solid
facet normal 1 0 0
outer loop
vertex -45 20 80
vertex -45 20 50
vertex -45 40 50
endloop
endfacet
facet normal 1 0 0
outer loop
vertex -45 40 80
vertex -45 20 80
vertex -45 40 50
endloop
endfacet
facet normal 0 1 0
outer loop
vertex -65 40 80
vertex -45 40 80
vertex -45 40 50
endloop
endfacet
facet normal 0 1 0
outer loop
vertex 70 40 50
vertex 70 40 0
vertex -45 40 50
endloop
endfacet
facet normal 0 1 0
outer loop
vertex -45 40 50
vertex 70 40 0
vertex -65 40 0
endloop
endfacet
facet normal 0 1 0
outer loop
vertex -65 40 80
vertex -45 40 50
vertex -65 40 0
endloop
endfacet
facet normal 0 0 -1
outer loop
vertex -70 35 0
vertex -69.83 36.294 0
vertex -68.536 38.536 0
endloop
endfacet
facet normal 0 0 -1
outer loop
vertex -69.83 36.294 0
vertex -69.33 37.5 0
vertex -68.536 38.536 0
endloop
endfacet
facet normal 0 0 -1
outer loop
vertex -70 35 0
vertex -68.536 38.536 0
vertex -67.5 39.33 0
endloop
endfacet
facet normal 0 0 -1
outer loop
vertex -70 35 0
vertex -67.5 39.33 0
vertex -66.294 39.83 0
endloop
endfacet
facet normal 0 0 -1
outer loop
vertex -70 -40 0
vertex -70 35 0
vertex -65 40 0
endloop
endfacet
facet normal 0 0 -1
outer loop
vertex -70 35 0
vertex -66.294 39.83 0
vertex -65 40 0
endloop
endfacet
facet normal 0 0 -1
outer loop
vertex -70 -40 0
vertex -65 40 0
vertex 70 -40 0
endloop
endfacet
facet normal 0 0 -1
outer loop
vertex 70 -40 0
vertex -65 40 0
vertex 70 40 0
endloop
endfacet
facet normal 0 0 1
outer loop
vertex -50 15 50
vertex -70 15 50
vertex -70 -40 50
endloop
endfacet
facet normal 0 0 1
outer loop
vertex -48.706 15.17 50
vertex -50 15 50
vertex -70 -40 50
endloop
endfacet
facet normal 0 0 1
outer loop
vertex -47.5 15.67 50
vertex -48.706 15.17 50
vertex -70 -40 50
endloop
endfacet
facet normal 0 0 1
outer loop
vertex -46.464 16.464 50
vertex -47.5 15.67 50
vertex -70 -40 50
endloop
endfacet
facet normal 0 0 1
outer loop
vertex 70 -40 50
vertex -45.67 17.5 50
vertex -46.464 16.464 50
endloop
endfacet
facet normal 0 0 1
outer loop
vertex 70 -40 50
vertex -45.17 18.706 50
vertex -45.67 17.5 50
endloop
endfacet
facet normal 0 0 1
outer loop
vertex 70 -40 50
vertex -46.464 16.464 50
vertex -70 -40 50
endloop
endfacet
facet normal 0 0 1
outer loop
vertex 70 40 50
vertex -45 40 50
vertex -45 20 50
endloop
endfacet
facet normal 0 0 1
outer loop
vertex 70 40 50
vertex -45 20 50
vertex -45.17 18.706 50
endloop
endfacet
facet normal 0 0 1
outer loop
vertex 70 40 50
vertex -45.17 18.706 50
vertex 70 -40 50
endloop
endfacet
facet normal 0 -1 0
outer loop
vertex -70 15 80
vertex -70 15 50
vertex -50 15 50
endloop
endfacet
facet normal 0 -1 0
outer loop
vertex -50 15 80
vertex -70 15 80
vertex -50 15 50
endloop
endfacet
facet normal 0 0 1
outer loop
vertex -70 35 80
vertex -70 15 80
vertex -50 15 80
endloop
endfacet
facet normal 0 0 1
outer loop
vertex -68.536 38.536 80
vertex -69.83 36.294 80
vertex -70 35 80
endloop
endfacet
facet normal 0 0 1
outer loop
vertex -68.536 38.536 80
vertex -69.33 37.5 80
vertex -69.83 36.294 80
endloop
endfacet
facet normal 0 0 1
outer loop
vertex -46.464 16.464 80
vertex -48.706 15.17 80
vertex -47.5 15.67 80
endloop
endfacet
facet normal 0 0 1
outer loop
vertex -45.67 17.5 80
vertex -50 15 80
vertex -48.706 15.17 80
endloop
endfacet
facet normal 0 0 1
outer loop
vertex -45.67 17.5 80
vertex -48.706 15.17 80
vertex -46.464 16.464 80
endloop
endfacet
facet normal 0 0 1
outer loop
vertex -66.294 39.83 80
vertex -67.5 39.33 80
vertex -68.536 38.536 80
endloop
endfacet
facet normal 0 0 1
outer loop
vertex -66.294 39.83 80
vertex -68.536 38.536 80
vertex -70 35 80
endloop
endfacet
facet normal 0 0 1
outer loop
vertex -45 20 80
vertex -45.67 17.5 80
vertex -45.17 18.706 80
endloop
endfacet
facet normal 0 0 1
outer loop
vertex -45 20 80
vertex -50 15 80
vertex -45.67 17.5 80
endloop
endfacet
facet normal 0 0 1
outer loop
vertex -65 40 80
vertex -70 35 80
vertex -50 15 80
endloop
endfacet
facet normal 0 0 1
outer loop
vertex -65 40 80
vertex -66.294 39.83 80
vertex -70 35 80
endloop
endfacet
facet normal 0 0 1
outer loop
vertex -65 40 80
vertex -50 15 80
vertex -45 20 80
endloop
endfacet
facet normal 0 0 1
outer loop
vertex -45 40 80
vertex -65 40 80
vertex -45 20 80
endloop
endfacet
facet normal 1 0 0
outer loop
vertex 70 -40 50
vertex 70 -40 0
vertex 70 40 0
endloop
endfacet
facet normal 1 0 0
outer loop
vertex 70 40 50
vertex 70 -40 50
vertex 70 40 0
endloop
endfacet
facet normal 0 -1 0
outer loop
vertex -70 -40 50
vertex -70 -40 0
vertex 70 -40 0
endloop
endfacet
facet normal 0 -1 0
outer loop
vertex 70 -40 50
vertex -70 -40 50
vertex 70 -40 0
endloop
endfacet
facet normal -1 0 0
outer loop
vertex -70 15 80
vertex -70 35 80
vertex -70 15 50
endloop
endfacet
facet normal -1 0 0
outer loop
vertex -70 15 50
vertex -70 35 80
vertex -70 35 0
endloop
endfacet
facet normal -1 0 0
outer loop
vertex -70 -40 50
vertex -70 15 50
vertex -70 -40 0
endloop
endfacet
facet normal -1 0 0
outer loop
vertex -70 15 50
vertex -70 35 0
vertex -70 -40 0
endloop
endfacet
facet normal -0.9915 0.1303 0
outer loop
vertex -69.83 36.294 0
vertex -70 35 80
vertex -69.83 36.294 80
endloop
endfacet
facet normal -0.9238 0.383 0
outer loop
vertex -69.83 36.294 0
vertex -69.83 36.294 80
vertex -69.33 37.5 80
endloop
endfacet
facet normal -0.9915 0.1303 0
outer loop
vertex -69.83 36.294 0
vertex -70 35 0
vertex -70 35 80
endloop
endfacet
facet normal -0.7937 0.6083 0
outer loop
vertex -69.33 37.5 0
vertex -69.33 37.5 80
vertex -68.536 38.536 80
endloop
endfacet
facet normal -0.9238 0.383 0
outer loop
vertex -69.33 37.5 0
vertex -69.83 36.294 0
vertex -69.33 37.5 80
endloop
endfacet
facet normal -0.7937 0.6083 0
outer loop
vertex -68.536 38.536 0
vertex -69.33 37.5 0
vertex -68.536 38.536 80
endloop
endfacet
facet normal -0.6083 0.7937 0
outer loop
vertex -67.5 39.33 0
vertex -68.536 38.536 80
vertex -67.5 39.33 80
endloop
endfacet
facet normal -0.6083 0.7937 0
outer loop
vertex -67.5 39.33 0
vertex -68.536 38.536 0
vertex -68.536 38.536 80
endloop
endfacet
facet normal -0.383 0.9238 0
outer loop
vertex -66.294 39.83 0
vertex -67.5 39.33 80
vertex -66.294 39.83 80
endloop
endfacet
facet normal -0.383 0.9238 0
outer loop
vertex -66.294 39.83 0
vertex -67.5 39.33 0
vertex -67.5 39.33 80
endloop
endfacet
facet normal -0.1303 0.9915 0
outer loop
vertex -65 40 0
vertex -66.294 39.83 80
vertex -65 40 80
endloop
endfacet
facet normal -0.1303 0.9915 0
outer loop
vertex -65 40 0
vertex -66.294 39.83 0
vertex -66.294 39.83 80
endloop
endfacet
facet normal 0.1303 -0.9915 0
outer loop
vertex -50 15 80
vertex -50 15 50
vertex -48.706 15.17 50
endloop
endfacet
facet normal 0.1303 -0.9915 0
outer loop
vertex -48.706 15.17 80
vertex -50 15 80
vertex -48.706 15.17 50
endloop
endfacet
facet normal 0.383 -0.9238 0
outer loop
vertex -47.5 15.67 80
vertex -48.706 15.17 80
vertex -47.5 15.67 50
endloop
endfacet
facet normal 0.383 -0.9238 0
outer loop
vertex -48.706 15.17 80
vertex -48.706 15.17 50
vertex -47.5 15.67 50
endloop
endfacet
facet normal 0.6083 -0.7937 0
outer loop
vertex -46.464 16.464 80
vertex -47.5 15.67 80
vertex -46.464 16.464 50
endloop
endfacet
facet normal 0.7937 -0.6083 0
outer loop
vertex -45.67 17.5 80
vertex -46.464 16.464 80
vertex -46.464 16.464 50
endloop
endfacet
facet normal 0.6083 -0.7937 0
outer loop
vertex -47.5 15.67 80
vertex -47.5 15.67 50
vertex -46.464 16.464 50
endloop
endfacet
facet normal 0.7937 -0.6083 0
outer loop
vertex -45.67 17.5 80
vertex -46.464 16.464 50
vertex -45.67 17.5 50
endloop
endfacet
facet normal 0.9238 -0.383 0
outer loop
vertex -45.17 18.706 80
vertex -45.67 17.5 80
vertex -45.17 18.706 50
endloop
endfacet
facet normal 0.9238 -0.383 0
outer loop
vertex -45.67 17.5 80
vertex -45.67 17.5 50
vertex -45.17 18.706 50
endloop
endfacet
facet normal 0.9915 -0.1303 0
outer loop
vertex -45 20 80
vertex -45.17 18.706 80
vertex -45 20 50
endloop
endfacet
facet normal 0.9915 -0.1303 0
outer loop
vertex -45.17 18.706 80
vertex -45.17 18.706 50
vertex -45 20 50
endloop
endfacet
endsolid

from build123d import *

# Parameters (mm, degrees)
F1_DEPTH = 50
F3_DEPTH = 30
F4_R     = 5


with BuildPart() as f1:
    # F0 (on Top) → F1 (new body)
    with BuildSketch(Plane.XY):
        Polygon((0, 40), (-70, 40), (-70, -40), (0, -40), (0, 0), align=None)
        Polygon((70, 40), (0, 40), (0, 0), (0, -40), (70, -40), align=None)
    extrude(amount=F1_DEPTH)

    # F2 (on face) → F3 (join)
    with BuildSketch(Plane.XY.offset(50)):
        with BuildLine():
            Line((-70, 40), (-70, 15))
            Line((-70, 15), (-50, 15))
            ThreePointArc((-50, 15), (-46.464466, 16.464466), (-45, 20))
            Line((-45, 20), (-45, 40))
            Line((-45, 40), (-70, 40))
        make_face()
    extrude(amount=F3_DEPTH)

    # F4
    f4_edges = [f1.edges().sort_by_distance(p)[0] for p in [
        (-70, 40, 40),
    ]]
    fillet(f4_edges, radius=F4_R)


solid = f1.part
